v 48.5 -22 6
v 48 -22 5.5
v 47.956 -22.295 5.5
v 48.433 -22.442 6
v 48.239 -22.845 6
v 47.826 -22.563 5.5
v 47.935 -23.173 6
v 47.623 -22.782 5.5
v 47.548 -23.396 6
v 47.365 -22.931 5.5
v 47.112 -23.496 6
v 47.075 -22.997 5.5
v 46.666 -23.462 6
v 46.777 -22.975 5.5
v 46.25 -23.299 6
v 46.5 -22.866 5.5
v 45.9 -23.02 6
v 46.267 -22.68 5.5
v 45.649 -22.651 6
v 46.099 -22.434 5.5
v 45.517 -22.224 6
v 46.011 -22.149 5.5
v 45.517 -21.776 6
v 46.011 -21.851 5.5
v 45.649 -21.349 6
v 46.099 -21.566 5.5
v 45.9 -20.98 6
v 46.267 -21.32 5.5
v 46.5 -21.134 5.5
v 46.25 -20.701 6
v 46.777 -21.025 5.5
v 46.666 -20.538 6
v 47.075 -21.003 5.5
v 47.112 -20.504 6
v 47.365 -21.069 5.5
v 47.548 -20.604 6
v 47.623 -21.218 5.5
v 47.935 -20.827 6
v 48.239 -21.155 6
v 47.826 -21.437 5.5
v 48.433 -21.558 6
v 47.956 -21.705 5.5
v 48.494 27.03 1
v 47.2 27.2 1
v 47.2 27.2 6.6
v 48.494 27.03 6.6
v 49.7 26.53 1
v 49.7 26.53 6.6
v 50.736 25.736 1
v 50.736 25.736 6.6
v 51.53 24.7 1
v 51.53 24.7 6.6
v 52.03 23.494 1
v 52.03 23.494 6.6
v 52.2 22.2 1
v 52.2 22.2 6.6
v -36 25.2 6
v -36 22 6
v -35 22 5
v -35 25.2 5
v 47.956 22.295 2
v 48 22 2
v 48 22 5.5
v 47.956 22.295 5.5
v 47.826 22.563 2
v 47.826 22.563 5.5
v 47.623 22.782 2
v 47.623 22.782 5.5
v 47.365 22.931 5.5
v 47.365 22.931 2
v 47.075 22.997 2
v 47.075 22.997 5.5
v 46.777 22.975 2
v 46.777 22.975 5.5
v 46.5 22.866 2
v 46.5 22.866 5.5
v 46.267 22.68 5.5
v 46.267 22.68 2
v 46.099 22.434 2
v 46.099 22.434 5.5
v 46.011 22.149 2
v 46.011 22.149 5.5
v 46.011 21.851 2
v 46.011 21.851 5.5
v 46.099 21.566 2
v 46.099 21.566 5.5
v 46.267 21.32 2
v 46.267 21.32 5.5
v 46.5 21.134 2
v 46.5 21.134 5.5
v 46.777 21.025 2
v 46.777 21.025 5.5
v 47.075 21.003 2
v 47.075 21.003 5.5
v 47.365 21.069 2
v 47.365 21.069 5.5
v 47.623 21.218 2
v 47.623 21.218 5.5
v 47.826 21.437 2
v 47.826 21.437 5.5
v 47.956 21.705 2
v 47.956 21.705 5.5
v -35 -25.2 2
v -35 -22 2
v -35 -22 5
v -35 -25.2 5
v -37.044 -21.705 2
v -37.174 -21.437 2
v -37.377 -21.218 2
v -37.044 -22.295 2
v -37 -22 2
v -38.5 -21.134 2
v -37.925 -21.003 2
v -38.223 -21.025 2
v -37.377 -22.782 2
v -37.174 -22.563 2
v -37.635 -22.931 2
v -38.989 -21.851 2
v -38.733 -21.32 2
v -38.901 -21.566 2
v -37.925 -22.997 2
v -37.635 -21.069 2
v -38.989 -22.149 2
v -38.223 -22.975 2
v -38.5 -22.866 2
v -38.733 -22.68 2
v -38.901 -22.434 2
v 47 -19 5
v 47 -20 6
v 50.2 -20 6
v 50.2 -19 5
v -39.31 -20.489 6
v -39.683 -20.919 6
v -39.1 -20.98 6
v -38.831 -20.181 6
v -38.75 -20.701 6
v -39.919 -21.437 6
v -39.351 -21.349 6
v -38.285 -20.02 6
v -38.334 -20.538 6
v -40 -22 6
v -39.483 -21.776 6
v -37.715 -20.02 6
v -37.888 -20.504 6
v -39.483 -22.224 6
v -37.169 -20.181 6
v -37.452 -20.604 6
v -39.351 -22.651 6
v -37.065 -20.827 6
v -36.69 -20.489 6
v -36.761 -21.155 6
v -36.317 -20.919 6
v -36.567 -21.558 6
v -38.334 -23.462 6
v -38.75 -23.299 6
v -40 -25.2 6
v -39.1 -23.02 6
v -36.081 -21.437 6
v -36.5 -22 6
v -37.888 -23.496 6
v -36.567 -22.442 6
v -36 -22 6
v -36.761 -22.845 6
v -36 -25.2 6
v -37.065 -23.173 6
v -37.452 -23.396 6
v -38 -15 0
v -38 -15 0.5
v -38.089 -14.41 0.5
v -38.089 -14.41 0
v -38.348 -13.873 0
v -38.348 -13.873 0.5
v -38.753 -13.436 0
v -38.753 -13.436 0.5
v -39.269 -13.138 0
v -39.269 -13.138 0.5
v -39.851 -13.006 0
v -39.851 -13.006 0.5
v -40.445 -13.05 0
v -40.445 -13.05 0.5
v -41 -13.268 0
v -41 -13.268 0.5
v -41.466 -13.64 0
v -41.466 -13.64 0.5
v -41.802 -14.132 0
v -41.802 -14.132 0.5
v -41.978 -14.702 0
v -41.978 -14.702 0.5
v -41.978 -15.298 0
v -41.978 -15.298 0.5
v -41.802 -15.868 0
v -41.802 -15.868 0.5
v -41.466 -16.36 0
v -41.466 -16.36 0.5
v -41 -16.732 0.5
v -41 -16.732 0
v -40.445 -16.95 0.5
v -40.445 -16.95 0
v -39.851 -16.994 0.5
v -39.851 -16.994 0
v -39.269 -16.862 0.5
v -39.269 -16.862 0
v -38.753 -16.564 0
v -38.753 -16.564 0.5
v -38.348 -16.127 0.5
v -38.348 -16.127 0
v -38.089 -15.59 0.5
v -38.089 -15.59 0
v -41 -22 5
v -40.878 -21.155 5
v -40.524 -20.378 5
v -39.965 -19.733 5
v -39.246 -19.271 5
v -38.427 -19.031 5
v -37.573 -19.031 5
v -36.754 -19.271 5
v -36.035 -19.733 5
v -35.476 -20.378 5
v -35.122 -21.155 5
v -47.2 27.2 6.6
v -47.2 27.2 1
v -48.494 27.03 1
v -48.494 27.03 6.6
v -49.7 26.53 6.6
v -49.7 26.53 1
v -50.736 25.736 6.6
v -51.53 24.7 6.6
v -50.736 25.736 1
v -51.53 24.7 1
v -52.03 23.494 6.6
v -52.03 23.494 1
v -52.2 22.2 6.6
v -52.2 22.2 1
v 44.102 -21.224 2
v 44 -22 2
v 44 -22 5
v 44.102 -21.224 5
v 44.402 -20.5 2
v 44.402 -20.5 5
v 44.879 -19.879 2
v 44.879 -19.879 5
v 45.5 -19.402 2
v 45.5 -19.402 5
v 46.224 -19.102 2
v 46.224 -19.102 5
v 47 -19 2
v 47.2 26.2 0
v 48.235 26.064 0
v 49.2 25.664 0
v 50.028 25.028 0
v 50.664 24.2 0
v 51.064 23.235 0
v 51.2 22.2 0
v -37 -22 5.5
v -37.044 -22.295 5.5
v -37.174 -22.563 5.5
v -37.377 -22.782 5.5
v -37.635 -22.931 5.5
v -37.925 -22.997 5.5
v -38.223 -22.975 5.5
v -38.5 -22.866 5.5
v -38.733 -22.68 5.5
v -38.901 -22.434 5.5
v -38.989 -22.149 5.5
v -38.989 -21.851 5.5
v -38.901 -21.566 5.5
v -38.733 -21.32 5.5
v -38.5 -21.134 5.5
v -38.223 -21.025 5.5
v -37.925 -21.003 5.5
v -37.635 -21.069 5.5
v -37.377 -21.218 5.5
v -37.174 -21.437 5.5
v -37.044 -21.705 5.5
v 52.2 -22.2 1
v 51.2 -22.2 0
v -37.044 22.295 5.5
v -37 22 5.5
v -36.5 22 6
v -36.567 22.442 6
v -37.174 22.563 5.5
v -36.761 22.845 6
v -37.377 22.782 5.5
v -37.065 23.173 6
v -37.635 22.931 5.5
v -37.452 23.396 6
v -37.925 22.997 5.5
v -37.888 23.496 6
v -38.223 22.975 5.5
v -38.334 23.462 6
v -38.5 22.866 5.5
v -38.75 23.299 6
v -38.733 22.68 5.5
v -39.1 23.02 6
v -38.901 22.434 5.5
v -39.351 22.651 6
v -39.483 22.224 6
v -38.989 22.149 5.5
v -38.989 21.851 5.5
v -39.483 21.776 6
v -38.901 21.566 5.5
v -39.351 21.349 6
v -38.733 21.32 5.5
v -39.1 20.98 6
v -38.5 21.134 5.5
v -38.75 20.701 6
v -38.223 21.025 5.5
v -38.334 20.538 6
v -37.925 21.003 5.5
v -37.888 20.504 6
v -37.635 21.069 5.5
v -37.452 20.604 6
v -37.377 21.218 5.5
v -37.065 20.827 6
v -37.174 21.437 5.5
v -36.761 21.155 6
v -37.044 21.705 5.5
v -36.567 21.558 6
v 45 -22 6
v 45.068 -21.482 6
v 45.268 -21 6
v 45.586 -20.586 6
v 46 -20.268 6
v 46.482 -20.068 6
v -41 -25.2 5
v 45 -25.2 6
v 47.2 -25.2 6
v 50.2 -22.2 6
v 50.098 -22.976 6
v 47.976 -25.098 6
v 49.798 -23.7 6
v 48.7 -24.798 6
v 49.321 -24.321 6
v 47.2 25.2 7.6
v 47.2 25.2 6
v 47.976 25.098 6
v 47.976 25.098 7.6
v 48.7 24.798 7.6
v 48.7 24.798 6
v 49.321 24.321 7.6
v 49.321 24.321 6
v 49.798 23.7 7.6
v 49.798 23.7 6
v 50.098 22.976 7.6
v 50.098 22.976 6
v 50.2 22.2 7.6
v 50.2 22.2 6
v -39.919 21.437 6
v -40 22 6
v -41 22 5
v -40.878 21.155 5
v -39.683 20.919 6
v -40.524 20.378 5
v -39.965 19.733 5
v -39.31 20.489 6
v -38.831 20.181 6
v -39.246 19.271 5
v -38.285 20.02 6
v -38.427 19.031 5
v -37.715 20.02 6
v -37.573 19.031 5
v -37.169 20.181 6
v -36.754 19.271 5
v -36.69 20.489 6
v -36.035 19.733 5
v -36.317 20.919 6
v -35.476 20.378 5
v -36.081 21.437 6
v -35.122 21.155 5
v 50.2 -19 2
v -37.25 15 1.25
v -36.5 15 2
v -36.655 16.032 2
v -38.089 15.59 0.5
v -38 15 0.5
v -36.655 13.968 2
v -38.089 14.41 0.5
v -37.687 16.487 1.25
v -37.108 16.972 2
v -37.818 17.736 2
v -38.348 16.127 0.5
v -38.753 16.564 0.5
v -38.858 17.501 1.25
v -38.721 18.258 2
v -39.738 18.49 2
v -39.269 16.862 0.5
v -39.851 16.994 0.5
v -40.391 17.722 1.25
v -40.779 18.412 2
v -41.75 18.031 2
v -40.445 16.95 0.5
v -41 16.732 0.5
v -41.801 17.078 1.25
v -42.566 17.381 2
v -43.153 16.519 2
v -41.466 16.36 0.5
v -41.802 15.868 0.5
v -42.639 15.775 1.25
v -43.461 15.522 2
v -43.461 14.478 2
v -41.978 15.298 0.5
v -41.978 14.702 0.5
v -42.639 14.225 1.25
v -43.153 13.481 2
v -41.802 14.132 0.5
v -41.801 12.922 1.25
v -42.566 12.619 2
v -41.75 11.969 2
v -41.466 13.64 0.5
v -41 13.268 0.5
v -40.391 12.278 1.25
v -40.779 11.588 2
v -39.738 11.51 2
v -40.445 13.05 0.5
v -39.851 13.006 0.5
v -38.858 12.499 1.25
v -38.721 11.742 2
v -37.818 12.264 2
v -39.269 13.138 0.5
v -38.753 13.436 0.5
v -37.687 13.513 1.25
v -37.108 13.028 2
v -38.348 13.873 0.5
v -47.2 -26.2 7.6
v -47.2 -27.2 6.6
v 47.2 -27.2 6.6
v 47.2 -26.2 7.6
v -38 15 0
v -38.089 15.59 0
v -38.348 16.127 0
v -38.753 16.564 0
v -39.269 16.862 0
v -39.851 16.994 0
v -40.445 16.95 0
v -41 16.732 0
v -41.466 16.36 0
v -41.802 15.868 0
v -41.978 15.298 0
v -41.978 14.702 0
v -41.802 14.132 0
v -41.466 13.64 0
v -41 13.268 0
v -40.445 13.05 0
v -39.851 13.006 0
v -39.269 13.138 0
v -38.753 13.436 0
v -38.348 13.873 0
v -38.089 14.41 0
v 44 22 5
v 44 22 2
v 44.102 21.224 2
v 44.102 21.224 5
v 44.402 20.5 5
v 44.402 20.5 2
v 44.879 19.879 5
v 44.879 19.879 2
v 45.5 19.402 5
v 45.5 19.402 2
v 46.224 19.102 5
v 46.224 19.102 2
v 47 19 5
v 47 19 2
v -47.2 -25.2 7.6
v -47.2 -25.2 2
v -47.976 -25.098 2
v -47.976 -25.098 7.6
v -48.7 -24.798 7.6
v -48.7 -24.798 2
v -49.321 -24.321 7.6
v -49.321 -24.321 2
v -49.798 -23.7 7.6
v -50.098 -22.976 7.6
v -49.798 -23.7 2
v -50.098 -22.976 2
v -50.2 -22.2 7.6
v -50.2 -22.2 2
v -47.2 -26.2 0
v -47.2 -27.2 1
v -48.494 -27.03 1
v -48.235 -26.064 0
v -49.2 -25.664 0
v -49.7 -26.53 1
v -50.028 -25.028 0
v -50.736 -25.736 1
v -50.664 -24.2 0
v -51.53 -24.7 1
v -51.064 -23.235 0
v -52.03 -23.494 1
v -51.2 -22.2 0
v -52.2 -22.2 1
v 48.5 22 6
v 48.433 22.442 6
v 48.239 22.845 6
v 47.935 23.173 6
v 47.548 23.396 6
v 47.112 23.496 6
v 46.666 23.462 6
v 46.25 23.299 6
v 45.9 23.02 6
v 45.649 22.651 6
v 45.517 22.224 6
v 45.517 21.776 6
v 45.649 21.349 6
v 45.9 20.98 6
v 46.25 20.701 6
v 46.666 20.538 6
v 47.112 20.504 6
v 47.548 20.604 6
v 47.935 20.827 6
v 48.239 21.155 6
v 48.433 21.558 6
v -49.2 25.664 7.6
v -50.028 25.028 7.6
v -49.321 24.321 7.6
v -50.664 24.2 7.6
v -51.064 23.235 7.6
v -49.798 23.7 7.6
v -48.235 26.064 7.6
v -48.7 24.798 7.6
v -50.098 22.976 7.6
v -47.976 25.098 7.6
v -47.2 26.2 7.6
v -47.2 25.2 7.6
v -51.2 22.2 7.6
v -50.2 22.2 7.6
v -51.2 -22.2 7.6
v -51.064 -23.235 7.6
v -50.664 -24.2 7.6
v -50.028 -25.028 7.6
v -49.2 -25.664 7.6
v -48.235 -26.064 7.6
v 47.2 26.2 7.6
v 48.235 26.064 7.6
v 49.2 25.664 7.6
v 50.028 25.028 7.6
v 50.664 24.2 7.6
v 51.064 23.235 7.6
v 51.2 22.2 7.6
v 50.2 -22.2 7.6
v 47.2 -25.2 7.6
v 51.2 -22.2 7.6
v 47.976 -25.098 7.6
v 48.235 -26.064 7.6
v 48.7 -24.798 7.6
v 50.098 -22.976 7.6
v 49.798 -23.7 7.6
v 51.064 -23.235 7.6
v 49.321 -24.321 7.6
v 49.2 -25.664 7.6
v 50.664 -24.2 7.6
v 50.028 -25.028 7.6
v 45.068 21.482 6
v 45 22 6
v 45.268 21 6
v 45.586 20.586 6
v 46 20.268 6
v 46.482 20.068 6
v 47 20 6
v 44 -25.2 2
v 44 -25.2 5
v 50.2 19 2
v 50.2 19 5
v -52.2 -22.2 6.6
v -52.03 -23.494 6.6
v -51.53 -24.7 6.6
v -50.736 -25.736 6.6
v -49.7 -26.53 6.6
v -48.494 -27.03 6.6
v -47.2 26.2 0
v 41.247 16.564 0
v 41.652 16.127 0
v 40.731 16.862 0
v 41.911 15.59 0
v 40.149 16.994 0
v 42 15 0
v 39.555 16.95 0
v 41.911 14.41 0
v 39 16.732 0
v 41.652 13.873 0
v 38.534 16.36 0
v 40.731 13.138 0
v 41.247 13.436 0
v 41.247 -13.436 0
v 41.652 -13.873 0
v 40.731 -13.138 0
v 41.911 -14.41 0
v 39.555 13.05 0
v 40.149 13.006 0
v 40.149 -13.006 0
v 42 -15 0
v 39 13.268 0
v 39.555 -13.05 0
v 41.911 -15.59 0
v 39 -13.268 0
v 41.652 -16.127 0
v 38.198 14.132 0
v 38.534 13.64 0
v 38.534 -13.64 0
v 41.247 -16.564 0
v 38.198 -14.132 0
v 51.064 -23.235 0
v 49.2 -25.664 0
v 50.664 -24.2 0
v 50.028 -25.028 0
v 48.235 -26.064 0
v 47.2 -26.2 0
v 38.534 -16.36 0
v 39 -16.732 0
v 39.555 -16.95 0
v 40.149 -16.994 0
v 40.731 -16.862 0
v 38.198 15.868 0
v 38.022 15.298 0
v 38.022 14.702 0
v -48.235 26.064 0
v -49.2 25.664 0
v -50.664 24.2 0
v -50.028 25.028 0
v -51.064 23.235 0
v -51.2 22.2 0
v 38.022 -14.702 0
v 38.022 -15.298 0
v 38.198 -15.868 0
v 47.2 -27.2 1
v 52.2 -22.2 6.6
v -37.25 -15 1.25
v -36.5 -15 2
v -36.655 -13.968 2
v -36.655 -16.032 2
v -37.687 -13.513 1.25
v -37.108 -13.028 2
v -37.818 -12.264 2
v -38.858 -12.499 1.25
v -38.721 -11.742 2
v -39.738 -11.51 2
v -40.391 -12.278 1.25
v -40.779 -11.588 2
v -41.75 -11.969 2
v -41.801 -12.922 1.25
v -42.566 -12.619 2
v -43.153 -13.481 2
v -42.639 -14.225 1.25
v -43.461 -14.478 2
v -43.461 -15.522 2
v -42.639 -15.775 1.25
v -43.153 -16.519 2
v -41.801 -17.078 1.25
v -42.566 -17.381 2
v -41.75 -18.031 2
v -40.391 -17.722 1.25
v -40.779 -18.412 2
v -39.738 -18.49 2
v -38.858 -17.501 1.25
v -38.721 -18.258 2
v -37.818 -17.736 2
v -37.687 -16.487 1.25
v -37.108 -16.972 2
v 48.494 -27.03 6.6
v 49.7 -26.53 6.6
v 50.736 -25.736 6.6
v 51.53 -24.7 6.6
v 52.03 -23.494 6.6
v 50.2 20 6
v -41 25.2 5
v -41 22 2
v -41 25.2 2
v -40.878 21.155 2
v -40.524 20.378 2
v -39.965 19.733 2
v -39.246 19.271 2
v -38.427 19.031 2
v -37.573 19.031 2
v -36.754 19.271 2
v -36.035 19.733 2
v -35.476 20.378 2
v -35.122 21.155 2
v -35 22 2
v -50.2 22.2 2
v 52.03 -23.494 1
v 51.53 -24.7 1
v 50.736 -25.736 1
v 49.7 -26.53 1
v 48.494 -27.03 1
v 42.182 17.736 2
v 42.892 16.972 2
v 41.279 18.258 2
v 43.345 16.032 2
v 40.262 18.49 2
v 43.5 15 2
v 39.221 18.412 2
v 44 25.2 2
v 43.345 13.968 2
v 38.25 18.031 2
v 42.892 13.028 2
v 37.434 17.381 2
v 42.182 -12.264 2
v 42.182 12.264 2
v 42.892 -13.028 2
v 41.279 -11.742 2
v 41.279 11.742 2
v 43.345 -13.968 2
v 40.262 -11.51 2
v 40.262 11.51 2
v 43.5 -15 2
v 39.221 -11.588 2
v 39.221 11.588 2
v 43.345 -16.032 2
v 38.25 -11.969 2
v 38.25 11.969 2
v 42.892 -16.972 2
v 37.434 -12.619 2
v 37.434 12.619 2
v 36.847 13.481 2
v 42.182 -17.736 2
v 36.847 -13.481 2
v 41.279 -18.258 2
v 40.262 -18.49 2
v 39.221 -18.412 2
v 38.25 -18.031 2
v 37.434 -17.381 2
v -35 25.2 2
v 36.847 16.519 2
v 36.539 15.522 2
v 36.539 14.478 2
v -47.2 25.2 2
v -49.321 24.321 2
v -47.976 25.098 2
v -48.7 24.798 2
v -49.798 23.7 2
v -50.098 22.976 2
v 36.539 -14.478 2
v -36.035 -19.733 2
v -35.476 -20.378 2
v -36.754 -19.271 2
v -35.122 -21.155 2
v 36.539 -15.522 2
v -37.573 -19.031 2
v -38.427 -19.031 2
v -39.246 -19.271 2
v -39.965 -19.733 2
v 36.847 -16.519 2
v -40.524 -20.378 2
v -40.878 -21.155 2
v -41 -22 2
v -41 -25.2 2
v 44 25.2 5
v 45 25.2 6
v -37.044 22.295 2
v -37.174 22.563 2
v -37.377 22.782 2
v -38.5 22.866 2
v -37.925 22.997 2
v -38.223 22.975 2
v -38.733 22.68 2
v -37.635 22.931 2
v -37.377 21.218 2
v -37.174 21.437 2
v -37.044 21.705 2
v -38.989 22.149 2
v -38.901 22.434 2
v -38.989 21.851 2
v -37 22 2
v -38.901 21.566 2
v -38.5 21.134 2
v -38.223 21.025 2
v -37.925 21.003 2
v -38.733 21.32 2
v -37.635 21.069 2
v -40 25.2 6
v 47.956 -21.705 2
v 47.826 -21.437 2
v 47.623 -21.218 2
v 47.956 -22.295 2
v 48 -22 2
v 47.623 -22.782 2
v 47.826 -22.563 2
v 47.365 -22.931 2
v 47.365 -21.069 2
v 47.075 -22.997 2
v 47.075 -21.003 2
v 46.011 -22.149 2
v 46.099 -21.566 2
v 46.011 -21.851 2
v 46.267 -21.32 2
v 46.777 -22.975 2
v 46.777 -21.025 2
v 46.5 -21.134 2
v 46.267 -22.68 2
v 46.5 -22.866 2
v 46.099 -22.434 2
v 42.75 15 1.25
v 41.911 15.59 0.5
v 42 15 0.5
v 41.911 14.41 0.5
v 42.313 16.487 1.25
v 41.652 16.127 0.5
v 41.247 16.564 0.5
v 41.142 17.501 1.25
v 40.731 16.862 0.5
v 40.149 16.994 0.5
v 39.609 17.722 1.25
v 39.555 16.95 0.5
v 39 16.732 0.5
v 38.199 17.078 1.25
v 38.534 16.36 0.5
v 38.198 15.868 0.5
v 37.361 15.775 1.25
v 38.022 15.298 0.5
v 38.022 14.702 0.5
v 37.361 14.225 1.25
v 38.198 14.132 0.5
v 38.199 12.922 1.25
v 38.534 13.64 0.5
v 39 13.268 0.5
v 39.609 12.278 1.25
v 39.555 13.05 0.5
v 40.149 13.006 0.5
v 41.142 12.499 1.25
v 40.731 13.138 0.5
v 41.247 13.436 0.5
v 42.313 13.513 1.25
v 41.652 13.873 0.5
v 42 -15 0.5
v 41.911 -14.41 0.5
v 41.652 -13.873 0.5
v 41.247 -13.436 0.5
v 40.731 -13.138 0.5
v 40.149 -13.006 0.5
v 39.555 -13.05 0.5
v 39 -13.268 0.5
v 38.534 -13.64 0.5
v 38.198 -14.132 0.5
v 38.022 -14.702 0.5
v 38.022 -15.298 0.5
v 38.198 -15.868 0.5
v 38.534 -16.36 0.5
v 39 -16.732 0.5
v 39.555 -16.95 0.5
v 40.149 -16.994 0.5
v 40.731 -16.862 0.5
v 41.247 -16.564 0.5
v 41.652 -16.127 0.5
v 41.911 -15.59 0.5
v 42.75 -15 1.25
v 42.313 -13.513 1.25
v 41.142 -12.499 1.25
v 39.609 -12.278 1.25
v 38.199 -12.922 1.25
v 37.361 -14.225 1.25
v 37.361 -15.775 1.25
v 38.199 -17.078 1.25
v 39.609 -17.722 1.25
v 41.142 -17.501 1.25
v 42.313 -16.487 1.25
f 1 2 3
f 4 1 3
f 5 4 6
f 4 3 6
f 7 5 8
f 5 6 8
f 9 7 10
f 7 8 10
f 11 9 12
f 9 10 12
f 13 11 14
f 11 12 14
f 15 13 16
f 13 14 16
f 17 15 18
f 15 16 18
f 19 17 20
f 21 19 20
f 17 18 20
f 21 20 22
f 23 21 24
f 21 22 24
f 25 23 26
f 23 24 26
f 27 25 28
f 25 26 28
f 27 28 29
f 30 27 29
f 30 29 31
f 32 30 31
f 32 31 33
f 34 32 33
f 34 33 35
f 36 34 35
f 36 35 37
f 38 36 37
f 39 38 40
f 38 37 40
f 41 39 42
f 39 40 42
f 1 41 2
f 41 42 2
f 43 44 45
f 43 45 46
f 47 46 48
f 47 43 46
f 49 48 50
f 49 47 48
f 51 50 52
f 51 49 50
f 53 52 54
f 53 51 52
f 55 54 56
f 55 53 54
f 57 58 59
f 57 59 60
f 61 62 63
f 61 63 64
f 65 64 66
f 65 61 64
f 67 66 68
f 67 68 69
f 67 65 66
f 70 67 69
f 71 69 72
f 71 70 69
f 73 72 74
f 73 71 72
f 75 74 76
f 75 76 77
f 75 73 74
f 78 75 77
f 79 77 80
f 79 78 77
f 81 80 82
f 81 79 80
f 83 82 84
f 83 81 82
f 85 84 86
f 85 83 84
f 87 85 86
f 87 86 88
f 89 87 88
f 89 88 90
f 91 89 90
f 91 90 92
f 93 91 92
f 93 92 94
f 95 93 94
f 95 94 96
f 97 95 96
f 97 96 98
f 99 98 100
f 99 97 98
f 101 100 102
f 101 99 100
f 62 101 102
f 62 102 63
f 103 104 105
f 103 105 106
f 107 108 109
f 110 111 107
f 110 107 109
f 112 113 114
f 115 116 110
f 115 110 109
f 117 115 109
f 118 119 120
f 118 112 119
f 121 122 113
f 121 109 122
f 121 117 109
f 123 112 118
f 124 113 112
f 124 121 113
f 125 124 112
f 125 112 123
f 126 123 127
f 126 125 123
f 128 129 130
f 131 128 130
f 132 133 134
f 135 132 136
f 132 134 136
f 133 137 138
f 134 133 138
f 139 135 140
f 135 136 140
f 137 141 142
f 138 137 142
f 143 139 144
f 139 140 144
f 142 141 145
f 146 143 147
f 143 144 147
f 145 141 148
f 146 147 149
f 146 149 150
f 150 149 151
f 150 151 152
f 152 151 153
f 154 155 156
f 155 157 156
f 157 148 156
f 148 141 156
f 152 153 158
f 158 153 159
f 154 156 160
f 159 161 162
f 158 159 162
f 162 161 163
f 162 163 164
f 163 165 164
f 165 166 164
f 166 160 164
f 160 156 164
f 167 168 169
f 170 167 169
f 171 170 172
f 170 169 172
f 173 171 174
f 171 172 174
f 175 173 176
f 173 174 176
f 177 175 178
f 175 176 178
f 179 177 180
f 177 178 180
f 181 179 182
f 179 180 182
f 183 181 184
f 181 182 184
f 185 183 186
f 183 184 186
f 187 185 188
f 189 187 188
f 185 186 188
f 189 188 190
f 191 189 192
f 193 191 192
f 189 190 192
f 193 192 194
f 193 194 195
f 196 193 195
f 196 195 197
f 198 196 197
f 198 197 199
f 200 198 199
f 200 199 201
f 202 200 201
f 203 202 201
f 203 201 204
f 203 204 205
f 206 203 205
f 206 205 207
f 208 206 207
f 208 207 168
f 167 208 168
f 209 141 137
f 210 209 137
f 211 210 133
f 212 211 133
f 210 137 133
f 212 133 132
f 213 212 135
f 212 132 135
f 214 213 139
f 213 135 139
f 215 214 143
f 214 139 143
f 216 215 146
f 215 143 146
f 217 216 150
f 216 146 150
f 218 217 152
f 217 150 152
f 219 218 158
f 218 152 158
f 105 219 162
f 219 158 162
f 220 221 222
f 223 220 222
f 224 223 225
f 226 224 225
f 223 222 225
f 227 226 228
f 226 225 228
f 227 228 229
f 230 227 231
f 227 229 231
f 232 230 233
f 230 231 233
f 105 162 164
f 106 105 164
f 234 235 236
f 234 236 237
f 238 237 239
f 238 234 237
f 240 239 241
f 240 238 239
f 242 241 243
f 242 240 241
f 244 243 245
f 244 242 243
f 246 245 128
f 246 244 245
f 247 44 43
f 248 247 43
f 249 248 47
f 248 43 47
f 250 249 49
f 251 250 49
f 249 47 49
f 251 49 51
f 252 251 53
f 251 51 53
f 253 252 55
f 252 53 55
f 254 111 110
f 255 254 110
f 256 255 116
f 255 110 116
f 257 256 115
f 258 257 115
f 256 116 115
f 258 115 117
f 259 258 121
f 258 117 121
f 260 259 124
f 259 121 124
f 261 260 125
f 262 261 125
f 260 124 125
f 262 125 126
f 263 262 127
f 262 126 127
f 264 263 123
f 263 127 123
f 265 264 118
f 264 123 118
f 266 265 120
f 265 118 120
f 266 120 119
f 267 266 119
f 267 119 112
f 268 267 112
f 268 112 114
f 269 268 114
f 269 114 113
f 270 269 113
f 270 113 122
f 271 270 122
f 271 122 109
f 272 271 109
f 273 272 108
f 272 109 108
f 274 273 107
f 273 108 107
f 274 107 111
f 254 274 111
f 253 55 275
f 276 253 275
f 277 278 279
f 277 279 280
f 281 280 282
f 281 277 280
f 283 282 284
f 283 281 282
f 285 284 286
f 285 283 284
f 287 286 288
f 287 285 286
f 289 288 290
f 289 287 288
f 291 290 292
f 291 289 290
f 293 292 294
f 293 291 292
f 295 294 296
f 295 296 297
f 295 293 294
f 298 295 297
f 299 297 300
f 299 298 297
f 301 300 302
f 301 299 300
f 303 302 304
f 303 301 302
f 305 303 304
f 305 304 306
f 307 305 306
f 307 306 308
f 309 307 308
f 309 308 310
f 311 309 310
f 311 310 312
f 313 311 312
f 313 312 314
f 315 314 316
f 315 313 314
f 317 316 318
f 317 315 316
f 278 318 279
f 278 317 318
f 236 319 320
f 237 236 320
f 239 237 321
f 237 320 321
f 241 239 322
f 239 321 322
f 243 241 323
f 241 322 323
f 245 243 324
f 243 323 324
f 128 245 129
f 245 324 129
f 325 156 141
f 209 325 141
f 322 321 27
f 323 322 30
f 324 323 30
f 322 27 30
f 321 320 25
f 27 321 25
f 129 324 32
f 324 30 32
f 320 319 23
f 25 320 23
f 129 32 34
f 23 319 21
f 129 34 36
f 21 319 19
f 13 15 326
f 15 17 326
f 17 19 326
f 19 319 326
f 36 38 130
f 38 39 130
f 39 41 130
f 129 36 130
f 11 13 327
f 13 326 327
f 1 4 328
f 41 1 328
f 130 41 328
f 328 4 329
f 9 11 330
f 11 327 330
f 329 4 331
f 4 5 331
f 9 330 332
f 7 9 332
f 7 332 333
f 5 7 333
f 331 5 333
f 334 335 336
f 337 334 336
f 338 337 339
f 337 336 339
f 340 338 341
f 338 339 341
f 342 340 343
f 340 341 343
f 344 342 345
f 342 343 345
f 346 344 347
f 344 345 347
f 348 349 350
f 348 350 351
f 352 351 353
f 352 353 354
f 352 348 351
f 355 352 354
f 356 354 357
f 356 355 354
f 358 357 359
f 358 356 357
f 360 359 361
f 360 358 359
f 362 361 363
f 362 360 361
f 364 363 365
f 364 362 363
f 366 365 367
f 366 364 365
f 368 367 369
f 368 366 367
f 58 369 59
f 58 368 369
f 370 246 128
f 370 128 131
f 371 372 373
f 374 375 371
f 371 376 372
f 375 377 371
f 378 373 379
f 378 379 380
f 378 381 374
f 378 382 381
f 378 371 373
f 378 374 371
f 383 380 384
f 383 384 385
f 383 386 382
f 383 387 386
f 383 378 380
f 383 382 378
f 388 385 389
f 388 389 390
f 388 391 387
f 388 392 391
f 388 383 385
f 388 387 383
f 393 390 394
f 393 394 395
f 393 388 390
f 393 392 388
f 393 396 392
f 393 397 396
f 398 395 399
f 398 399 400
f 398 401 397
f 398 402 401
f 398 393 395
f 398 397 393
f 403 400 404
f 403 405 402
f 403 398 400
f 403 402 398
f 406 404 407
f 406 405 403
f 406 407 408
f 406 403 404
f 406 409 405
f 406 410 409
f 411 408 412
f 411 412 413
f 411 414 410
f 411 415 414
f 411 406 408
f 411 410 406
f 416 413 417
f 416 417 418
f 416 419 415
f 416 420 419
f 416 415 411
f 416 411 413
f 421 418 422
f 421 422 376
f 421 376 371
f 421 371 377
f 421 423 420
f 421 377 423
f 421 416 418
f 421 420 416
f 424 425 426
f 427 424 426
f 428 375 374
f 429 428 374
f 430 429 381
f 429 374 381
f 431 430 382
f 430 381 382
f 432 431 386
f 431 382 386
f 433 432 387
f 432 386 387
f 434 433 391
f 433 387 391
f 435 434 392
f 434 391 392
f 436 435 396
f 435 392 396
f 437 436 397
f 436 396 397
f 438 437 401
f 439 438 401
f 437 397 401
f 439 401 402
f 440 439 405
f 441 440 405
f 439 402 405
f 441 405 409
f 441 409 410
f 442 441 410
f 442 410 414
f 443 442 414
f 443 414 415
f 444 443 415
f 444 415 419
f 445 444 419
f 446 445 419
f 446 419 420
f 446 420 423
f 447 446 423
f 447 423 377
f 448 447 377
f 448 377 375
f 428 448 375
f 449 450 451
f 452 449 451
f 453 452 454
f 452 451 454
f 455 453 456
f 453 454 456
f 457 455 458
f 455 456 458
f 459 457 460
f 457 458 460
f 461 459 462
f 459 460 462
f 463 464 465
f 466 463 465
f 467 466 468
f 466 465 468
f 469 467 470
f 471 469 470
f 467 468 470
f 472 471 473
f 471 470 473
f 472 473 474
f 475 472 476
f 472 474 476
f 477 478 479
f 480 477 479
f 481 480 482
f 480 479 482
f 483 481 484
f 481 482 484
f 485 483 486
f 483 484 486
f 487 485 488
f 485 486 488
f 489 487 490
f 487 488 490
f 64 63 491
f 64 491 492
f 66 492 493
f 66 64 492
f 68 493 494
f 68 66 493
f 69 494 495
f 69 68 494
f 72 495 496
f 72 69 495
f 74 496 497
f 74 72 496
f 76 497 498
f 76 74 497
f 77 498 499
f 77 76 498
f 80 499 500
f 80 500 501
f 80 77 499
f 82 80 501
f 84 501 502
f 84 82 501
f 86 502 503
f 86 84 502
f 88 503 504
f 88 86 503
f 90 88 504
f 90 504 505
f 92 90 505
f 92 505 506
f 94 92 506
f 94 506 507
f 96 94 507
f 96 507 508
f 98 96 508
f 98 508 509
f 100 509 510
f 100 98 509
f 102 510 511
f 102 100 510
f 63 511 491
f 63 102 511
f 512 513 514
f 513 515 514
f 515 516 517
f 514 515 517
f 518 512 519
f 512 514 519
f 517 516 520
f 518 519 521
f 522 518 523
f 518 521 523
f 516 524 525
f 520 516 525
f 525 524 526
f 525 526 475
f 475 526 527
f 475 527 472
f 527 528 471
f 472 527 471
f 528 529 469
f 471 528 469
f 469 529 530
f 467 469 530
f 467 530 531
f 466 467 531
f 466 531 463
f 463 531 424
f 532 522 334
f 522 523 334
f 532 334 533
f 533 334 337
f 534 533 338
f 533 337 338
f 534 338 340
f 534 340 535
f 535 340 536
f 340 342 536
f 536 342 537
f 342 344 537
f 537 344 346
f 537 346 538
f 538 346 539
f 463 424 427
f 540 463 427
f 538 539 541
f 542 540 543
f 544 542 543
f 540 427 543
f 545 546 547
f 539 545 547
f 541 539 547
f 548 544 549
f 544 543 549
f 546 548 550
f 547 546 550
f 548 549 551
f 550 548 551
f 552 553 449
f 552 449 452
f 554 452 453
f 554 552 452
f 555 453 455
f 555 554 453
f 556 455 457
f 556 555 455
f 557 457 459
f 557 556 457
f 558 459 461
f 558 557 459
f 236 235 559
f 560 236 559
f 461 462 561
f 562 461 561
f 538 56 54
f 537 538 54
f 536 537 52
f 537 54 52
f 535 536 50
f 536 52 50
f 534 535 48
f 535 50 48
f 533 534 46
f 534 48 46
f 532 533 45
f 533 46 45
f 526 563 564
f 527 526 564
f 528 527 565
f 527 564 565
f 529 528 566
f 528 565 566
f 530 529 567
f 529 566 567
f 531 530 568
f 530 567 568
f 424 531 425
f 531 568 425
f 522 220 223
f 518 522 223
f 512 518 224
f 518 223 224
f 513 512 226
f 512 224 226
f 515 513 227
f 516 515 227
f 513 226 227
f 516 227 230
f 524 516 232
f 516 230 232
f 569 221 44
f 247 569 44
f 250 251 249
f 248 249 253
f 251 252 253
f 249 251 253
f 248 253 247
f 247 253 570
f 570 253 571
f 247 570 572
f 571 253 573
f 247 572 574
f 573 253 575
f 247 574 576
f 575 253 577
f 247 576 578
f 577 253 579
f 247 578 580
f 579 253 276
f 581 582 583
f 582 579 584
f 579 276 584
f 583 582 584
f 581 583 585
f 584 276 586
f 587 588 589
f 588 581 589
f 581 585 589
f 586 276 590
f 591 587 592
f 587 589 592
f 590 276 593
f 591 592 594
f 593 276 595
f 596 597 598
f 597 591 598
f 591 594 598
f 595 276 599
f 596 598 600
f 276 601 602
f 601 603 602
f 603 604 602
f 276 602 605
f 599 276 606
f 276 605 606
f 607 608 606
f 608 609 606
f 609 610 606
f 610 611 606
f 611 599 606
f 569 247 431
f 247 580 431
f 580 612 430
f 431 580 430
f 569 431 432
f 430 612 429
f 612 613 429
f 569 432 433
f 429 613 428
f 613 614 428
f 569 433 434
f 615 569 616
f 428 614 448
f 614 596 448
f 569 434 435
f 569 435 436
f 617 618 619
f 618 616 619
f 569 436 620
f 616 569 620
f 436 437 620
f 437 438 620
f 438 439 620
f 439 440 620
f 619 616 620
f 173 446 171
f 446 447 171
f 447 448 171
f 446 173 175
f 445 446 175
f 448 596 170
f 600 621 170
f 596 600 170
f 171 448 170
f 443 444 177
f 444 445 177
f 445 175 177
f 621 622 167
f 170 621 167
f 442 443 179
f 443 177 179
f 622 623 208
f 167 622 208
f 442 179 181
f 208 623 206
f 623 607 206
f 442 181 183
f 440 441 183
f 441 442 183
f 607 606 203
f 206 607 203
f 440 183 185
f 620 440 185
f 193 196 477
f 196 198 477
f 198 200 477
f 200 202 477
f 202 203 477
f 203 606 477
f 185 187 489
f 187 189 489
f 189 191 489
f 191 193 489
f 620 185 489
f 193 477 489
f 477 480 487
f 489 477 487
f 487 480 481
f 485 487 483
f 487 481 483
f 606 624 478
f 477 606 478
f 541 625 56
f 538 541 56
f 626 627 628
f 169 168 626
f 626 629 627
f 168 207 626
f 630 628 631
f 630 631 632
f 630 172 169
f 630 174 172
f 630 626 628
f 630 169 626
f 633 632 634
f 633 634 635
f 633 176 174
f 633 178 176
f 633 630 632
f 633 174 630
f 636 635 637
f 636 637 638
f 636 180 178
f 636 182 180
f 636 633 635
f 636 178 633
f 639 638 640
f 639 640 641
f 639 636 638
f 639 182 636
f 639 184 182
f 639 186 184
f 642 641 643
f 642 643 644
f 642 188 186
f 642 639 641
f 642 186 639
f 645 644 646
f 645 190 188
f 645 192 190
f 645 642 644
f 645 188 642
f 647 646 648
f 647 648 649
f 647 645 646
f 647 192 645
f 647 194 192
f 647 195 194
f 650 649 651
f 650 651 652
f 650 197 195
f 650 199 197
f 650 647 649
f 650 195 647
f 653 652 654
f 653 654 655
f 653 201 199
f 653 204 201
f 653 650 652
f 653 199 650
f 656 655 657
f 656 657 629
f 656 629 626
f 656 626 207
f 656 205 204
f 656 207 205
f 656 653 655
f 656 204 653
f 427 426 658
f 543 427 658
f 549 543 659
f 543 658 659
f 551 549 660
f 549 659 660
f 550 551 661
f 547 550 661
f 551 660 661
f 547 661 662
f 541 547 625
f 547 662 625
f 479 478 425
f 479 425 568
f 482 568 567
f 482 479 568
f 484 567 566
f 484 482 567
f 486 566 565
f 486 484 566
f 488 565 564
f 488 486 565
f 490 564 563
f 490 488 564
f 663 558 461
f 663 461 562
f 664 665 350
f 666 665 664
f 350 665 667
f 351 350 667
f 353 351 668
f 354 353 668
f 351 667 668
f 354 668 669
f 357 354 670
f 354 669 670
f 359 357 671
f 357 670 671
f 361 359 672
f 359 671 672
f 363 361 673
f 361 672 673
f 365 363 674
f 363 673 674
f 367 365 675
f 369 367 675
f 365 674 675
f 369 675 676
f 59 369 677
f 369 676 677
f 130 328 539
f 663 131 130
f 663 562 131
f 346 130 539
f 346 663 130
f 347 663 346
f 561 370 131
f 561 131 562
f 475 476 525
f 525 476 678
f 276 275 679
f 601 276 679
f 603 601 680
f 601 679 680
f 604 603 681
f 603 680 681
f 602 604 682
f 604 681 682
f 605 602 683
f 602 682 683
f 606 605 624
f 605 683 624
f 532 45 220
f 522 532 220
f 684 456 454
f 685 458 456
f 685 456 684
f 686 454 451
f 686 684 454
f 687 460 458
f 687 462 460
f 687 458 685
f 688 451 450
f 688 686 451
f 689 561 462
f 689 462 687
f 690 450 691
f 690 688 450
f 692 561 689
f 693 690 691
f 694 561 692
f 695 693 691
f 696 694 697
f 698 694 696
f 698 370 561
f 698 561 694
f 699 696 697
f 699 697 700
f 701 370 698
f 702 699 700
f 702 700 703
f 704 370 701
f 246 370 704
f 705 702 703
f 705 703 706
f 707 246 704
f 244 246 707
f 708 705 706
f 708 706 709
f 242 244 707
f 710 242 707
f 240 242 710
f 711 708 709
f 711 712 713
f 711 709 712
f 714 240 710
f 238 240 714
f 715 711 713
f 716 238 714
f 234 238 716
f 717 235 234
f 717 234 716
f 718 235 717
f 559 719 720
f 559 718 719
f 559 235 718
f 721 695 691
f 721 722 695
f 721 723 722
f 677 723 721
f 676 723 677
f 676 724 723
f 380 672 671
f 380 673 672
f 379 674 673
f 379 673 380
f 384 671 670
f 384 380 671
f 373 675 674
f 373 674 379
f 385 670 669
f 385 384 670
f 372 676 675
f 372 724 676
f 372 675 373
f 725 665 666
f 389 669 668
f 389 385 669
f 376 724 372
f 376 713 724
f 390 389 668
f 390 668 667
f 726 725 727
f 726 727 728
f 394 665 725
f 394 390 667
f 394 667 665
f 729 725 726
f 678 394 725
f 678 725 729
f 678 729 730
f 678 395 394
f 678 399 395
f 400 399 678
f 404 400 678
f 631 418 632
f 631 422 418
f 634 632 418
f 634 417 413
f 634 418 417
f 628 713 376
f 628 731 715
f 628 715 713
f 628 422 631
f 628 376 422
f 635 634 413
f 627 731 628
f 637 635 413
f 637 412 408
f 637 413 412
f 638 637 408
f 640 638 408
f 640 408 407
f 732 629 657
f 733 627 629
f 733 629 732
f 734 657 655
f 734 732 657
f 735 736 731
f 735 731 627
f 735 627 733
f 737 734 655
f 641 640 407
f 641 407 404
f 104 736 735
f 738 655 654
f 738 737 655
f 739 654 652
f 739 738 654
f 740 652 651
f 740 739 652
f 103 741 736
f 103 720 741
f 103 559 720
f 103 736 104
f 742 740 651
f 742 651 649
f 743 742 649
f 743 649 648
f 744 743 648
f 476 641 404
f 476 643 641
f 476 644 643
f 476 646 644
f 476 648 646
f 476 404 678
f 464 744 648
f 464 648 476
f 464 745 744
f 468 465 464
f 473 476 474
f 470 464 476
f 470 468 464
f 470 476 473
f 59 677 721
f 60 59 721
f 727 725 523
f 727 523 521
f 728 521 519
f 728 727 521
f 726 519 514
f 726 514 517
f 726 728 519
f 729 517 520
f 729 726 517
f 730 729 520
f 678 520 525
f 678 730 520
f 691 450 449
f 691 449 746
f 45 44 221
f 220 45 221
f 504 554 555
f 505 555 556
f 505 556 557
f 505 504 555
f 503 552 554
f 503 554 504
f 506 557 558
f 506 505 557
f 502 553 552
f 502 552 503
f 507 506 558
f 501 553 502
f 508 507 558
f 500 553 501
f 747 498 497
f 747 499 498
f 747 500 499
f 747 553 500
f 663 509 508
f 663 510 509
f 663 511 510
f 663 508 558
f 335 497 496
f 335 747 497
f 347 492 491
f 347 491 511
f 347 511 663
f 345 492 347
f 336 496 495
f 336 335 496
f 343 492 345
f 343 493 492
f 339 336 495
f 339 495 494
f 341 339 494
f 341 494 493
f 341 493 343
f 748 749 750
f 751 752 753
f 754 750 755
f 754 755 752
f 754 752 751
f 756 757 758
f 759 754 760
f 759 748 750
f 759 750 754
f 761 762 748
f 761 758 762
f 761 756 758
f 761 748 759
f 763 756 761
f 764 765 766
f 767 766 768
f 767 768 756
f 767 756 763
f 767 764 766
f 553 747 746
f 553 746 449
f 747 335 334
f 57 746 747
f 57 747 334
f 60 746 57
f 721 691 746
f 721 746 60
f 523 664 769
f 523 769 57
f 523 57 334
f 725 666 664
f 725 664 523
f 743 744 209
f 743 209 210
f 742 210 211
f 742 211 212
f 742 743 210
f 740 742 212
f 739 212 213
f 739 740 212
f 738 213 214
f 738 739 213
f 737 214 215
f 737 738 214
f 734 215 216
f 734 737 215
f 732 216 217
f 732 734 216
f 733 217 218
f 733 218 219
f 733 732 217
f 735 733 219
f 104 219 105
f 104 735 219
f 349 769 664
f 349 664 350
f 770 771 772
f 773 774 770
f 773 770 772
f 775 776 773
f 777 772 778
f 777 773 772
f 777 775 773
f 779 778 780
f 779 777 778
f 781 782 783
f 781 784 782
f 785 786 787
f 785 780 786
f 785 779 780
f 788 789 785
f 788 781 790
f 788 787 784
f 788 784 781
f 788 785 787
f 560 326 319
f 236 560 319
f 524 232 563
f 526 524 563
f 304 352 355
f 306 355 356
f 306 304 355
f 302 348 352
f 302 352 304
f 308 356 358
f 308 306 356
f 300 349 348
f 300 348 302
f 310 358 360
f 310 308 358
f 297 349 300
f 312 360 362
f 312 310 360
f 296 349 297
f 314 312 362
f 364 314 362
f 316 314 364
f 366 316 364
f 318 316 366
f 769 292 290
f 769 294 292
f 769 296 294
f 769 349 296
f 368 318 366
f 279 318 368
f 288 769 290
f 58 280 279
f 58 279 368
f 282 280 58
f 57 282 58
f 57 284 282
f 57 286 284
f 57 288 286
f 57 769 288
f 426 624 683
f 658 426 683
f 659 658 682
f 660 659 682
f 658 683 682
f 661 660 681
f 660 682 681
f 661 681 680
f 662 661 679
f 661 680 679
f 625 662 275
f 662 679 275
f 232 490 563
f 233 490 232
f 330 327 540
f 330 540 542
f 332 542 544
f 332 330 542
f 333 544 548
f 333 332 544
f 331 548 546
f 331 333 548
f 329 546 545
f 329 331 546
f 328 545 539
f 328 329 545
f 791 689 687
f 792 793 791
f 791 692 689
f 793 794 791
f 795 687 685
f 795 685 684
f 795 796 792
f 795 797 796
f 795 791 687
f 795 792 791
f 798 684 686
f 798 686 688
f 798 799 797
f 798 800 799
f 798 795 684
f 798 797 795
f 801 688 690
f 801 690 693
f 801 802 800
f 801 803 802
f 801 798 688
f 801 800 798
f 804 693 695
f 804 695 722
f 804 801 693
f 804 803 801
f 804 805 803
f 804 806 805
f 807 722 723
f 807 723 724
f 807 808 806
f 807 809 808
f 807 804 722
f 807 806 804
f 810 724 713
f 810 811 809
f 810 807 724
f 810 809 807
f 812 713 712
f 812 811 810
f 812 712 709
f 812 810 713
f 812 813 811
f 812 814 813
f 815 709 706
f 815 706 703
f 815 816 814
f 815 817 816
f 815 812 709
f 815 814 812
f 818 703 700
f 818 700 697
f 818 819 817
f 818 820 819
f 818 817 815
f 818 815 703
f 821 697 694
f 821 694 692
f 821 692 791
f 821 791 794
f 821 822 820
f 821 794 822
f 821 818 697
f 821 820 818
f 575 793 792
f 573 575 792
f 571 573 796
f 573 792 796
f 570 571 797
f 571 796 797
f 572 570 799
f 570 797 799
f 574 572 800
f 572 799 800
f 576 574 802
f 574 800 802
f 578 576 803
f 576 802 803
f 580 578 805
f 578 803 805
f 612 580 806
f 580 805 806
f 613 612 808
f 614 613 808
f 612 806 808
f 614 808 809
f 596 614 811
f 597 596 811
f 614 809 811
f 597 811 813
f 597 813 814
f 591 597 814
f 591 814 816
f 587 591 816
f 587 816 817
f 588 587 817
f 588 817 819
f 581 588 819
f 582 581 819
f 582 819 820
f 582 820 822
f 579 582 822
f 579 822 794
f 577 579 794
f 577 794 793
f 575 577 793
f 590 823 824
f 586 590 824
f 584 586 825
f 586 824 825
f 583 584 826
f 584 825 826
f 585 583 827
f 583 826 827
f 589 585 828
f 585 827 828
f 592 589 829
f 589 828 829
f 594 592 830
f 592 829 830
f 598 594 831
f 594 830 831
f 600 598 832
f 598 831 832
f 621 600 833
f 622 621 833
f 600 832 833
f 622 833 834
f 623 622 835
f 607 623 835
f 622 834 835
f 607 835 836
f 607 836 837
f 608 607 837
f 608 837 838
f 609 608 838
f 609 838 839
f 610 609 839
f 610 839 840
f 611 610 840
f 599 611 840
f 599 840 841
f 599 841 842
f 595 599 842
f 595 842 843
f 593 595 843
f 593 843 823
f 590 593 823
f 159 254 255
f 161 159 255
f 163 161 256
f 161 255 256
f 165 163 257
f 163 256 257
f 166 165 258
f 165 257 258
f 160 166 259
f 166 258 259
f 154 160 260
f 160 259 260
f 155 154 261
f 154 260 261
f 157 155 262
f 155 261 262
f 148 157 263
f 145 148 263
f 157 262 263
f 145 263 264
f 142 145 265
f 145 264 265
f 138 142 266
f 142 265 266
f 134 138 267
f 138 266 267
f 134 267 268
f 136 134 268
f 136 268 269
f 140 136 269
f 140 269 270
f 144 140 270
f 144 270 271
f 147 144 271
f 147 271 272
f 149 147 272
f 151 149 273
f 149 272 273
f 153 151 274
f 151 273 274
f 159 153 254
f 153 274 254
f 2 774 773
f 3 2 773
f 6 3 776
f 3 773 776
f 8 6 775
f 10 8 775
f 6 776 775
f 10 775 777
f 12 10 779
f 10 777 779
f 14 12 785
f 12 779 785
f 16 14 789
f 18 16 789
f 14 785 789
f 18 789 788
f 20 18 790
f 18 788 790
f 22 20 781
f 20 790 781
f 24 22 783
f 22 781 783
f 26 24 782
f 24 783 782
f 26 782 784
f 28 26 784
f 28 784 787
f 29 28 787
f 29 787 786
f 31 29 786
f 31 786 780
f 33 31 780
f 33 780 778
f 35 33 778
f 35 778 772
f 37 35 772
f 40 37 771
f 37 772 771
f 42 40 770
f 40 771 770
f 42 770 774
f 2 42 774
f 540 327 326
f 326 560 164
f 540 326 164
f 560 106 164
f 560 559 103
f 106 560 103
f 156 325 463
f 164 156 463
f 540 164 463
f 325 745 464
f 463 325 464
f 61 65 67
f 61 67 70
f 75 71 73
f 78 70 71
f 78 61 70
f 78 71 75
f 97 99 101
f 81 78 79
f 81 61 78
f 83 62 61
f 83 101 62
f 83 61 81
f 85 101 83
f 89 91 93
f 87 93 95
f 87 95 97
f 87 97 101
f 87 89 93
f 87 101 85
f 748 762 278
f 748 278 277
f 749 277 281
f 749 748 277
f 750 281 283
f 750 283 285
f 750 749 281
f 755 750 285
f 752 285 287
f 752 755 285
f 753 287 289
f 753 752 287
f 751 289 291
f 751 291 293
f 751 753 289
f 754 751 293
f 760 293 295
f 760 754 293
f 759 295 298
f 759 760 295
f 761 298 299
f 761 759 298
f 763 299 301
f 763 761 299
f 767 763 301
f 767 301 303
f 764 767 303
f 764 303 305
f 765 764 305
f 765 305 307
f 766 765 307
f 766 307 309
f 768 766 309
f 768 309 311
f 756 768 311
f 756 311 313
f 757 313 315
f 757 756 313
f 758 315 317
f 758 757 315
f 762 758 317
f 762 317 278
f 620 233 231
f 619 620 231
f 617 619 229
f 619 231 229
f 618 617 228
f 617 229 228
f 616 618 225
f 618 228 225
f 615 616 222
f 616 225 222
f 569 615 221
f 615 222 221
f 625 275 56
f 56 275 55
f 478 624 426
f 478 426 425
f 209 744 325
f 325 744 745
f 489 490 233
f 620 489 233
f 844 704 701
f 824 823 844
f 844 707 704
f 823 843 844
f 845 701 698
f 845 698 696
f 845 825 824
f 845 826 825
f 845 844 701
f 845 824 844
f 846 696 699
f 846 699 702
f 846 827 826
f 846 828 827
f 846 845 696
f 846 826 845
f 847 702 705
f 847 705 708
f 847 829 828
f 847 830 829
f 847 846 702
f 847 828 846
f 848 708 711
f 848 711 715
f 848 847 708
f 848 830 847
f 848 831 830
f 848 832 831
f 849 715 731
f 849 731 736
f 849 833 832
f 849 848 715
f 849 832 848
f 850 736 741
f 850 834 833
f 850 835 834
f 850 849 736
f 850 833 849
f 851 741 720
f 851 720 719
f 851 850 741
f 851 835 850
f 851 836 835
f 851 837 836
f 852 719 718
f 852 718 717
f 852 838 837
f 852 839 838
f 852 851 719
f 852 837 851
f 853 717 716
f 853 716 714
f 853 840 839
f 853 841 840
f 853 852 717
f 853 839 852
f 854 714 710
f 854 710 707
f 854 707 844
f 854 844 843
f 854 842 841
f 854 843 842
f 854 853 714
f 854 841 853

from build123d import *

# Parameters (mm, degrees)
PAD_DEPTH                  = 7.6
PAD_MIRRORED_2_DEPTH       = 7.6
PAD001_DEPTH               = 2
PAD001_MIRRORED002_2_DEPTH = 2
SKETCH002_R                = 1
PAD002_DEPTH               = 4
SKETCH003_R                = 2
POCKET073_DEPTH            = 5
CHAMFER035_SIZE            = 1
CHAMFER036_SIZE            = 1
CHAMFER037_SIZE            = 0.5
CHAMFER038_SIZE            = 1.5


with BuildPart() as part:
    # Sketch → Pad (new body)
    with BuildSketch(Plane.XY):
        with BuildLine():
            ThreePointArc((-47.2, 25.2), (-49.32132, 24.32132), (-50.2, 22.2))
            Line((-50.2, 22.2), (-50.2, 0))
            Line((-52.2, 0), (-50.2, 0))
            Line((-52.2, 22.2), (-52.2, 0))
            ThreePointArc((-47.2, 27.2), (-50.735534, 25.735534), (-52.2, 22.2))
            Line((-47.2, 27.2), (0, 27.2))
            Line((0, 27.2), (0, 25.2))
            Line((-47.2, 25.2), (0, 25.2))
        make_face()
    pad = extrude(amount=PAD_DEPTH)

    # Sketch Mirrored 2 → Pad Mirrored 2 (add)
    with BuildSketch(Plane(origin=(0, 0, 0), x_dir=(-1, 0, 0), z_dir=(0, 0, -1))):
        with BuildLine():
            ThreePointArc((-47.2, 25.2), (-49.32132, 24.32132), (-50.2, 22.2))
            Line((-50.2, 22.2), (-50.2, 0))
            Line((-52.2, 0), (-50.2, 0))
            Line((-52.2, 22.2), (-52.2, 0))
            ThreePointArc((-47.2, 27.2), (-50.735534, 25.735534), (-52.2, 22.2))
            Line((-47.2, 27.2), (0, 27.2))
            Line((0, 27.2), (0, 25.2))
            Line((-47.2, 25.2), (0, 25.2))
        make_face()
    pad_mirrored_2 = extrude(amount=-PAD_MIRRORED_2_DEPTH)

    # Mirrored001: Pad, Pad Mirrored 2 across Sketch H_Axis
    add(pad.mirror(Plane.ZX))
    add(pad_mirrored_2.mirror(Plane.ZX))

    # Sketch001 → Pad001 (join)
    with BuildSketch(Plane.XY):
        with BuildLine():
            ThreePointArc((-47.2, 25.2), (-49.32132, 24.32132), (-50.2, 22.2))
            Line((-50.2, 22.2), (-50.2, 0))
            Line((-50.2, 0), (0, 0))
            Line((0, 0), (0, 25.2))
            Line((-47.2, 25.2), (0, 25.2))
        make_face()
    pad001 = extrude(amount=PAD001_DEPTH)

    # Sketch001 Mirrored002 2 → Pad001 Mirrored002 2 (add)
    with BuildSketch(Plane(origin=(0, 0, 0), x_dir=(-1, 0, 0), z_dir=(0, 0, -1))):
        with BuildLine():
            ThreePointArc((-47.2, 25.2), (-49.32132, 24.32132), (-50.2, 22.2))
            Line((-50.2, 22.2), (-50.2, 0))
            Line((-50.2, 0), (0, 0))
            Line((0, 0), (0, 25.2))
            Line((-47.2, 25.2), (0, 25.2))
        make_face()
    pad001_mirrored002_2 = extrude(amount=-PAD001_MIRRORED002_2_DEPTH)

    # Mirrored003: Pad001, Pad001 Mirrored002 2 across Sketch001 H_Axis
    add(pad001.mirror(Plane.ZX))
    add(pad001_mirrored002_2.mirror(Plane.ZX))

    # Sketch002 (on Face19 of MultiTransform001) → Pad002 (join)
    with BuildSketch(Plane.XY.offset(2)):
        with BuildLine():
            ThreePointArc((50.2, 22.2), (49.32132, 24.32132), (47.2, 25.2))
            Line((47.2, 25.2), (44, 25.2))
            Line((44, 22), (44, 25.2))
            ThreePointArc((44, 22), (44.87868, 19.87868), (47, 19))
            Line((47, 19), (50.2, 19))
            Line((50.2, 22.2), (50.2, 19))
        make_face()
        with Locations((47, 22)):
            Circle(SKETCH002_R, mode=Mode.SUBTRACT)
        with BuildLine():
            ThreePointArc((-41, 22), (-38, 19), (-35, 22))
            Line((-35, 22), (-35, 25.2))
            Line((-41, 25.2), (-35, 25.2))
            Line((-41, 22), (-41, 25.2))
        make_face()
        with Locations((-38, 22)):
            Circle(SKETCH002_R, mode=Mode.SUBTRACT)
    pad002 = extrude(amount=PAD002_DEPTH)

    # Mirrored004: Pad002 across Sketch002 H_Axis
    add(pad002.mirror(Plane(origin=(0, 0, 2), x_dir=(0, 0, 1), z_dir=(0, 1, 0))))

    # Sketch003 (on DatumPlane) → Pocket073 (cut)
    with BuildSketch(Plane.XY.offset(2)):
        with Locations((-40, 15)):
            Circle(SKETCH003_R)
        with Locations((40, 15)):
            Circle(SKETCH003_R)
        with Locations((40, -15)):
            Circle(SKETCH003_R)
        with Locations((-40, -15)):
            Circle(SKETCH003_R)
    extrude(amount=-POCKET073_DEPTH, mode=Mode.SUBTRACT)

    # Chamfer035
    chamfer035_edges = [part.edges().sort_by_distance(p)[0] for p in [
        (-35, 23.6, 6),
        (-35, -23.6, 6),
        (48.6, 19, 6),
        (48.6, -19, 6),
    ]]
    chamfer(chamfer035_edges, length=CHAMFER035_SIZE)

    # Chamfer036
    chamfer036_edges = [part.edges().sort_by_distance(p)[0] for p in [
        (0, -27.2, 7.6),
        (0, -27.2, 0),
    ]]
    chamfer(chamfer036_edges, length=CHAMFER036_SIZE)

    # Chamfer037
    chamfer037_edges = [part.edges().sort_by_distance(p)[0] for p in [
        (-39, 22, 6),
        (-39, -22, 6),
        (46, -22, 6),
        (46, 22, 6),
    ]]
    chamfer(chamfer037_edges, length=CHAMFER037_SIZE)

    # Chamfer038
    chamfer038_edges = [part.edges().sort_by_distance(p)[0] for p in [
        (-42, 15, 2),
        (38, 15, 2),
        (38, -15, 2),
        (-42, -15, 2),
    ]]
    chamfer(chamfer038_edges, length=CHAMFER038_SIZE)


solid = part.part
